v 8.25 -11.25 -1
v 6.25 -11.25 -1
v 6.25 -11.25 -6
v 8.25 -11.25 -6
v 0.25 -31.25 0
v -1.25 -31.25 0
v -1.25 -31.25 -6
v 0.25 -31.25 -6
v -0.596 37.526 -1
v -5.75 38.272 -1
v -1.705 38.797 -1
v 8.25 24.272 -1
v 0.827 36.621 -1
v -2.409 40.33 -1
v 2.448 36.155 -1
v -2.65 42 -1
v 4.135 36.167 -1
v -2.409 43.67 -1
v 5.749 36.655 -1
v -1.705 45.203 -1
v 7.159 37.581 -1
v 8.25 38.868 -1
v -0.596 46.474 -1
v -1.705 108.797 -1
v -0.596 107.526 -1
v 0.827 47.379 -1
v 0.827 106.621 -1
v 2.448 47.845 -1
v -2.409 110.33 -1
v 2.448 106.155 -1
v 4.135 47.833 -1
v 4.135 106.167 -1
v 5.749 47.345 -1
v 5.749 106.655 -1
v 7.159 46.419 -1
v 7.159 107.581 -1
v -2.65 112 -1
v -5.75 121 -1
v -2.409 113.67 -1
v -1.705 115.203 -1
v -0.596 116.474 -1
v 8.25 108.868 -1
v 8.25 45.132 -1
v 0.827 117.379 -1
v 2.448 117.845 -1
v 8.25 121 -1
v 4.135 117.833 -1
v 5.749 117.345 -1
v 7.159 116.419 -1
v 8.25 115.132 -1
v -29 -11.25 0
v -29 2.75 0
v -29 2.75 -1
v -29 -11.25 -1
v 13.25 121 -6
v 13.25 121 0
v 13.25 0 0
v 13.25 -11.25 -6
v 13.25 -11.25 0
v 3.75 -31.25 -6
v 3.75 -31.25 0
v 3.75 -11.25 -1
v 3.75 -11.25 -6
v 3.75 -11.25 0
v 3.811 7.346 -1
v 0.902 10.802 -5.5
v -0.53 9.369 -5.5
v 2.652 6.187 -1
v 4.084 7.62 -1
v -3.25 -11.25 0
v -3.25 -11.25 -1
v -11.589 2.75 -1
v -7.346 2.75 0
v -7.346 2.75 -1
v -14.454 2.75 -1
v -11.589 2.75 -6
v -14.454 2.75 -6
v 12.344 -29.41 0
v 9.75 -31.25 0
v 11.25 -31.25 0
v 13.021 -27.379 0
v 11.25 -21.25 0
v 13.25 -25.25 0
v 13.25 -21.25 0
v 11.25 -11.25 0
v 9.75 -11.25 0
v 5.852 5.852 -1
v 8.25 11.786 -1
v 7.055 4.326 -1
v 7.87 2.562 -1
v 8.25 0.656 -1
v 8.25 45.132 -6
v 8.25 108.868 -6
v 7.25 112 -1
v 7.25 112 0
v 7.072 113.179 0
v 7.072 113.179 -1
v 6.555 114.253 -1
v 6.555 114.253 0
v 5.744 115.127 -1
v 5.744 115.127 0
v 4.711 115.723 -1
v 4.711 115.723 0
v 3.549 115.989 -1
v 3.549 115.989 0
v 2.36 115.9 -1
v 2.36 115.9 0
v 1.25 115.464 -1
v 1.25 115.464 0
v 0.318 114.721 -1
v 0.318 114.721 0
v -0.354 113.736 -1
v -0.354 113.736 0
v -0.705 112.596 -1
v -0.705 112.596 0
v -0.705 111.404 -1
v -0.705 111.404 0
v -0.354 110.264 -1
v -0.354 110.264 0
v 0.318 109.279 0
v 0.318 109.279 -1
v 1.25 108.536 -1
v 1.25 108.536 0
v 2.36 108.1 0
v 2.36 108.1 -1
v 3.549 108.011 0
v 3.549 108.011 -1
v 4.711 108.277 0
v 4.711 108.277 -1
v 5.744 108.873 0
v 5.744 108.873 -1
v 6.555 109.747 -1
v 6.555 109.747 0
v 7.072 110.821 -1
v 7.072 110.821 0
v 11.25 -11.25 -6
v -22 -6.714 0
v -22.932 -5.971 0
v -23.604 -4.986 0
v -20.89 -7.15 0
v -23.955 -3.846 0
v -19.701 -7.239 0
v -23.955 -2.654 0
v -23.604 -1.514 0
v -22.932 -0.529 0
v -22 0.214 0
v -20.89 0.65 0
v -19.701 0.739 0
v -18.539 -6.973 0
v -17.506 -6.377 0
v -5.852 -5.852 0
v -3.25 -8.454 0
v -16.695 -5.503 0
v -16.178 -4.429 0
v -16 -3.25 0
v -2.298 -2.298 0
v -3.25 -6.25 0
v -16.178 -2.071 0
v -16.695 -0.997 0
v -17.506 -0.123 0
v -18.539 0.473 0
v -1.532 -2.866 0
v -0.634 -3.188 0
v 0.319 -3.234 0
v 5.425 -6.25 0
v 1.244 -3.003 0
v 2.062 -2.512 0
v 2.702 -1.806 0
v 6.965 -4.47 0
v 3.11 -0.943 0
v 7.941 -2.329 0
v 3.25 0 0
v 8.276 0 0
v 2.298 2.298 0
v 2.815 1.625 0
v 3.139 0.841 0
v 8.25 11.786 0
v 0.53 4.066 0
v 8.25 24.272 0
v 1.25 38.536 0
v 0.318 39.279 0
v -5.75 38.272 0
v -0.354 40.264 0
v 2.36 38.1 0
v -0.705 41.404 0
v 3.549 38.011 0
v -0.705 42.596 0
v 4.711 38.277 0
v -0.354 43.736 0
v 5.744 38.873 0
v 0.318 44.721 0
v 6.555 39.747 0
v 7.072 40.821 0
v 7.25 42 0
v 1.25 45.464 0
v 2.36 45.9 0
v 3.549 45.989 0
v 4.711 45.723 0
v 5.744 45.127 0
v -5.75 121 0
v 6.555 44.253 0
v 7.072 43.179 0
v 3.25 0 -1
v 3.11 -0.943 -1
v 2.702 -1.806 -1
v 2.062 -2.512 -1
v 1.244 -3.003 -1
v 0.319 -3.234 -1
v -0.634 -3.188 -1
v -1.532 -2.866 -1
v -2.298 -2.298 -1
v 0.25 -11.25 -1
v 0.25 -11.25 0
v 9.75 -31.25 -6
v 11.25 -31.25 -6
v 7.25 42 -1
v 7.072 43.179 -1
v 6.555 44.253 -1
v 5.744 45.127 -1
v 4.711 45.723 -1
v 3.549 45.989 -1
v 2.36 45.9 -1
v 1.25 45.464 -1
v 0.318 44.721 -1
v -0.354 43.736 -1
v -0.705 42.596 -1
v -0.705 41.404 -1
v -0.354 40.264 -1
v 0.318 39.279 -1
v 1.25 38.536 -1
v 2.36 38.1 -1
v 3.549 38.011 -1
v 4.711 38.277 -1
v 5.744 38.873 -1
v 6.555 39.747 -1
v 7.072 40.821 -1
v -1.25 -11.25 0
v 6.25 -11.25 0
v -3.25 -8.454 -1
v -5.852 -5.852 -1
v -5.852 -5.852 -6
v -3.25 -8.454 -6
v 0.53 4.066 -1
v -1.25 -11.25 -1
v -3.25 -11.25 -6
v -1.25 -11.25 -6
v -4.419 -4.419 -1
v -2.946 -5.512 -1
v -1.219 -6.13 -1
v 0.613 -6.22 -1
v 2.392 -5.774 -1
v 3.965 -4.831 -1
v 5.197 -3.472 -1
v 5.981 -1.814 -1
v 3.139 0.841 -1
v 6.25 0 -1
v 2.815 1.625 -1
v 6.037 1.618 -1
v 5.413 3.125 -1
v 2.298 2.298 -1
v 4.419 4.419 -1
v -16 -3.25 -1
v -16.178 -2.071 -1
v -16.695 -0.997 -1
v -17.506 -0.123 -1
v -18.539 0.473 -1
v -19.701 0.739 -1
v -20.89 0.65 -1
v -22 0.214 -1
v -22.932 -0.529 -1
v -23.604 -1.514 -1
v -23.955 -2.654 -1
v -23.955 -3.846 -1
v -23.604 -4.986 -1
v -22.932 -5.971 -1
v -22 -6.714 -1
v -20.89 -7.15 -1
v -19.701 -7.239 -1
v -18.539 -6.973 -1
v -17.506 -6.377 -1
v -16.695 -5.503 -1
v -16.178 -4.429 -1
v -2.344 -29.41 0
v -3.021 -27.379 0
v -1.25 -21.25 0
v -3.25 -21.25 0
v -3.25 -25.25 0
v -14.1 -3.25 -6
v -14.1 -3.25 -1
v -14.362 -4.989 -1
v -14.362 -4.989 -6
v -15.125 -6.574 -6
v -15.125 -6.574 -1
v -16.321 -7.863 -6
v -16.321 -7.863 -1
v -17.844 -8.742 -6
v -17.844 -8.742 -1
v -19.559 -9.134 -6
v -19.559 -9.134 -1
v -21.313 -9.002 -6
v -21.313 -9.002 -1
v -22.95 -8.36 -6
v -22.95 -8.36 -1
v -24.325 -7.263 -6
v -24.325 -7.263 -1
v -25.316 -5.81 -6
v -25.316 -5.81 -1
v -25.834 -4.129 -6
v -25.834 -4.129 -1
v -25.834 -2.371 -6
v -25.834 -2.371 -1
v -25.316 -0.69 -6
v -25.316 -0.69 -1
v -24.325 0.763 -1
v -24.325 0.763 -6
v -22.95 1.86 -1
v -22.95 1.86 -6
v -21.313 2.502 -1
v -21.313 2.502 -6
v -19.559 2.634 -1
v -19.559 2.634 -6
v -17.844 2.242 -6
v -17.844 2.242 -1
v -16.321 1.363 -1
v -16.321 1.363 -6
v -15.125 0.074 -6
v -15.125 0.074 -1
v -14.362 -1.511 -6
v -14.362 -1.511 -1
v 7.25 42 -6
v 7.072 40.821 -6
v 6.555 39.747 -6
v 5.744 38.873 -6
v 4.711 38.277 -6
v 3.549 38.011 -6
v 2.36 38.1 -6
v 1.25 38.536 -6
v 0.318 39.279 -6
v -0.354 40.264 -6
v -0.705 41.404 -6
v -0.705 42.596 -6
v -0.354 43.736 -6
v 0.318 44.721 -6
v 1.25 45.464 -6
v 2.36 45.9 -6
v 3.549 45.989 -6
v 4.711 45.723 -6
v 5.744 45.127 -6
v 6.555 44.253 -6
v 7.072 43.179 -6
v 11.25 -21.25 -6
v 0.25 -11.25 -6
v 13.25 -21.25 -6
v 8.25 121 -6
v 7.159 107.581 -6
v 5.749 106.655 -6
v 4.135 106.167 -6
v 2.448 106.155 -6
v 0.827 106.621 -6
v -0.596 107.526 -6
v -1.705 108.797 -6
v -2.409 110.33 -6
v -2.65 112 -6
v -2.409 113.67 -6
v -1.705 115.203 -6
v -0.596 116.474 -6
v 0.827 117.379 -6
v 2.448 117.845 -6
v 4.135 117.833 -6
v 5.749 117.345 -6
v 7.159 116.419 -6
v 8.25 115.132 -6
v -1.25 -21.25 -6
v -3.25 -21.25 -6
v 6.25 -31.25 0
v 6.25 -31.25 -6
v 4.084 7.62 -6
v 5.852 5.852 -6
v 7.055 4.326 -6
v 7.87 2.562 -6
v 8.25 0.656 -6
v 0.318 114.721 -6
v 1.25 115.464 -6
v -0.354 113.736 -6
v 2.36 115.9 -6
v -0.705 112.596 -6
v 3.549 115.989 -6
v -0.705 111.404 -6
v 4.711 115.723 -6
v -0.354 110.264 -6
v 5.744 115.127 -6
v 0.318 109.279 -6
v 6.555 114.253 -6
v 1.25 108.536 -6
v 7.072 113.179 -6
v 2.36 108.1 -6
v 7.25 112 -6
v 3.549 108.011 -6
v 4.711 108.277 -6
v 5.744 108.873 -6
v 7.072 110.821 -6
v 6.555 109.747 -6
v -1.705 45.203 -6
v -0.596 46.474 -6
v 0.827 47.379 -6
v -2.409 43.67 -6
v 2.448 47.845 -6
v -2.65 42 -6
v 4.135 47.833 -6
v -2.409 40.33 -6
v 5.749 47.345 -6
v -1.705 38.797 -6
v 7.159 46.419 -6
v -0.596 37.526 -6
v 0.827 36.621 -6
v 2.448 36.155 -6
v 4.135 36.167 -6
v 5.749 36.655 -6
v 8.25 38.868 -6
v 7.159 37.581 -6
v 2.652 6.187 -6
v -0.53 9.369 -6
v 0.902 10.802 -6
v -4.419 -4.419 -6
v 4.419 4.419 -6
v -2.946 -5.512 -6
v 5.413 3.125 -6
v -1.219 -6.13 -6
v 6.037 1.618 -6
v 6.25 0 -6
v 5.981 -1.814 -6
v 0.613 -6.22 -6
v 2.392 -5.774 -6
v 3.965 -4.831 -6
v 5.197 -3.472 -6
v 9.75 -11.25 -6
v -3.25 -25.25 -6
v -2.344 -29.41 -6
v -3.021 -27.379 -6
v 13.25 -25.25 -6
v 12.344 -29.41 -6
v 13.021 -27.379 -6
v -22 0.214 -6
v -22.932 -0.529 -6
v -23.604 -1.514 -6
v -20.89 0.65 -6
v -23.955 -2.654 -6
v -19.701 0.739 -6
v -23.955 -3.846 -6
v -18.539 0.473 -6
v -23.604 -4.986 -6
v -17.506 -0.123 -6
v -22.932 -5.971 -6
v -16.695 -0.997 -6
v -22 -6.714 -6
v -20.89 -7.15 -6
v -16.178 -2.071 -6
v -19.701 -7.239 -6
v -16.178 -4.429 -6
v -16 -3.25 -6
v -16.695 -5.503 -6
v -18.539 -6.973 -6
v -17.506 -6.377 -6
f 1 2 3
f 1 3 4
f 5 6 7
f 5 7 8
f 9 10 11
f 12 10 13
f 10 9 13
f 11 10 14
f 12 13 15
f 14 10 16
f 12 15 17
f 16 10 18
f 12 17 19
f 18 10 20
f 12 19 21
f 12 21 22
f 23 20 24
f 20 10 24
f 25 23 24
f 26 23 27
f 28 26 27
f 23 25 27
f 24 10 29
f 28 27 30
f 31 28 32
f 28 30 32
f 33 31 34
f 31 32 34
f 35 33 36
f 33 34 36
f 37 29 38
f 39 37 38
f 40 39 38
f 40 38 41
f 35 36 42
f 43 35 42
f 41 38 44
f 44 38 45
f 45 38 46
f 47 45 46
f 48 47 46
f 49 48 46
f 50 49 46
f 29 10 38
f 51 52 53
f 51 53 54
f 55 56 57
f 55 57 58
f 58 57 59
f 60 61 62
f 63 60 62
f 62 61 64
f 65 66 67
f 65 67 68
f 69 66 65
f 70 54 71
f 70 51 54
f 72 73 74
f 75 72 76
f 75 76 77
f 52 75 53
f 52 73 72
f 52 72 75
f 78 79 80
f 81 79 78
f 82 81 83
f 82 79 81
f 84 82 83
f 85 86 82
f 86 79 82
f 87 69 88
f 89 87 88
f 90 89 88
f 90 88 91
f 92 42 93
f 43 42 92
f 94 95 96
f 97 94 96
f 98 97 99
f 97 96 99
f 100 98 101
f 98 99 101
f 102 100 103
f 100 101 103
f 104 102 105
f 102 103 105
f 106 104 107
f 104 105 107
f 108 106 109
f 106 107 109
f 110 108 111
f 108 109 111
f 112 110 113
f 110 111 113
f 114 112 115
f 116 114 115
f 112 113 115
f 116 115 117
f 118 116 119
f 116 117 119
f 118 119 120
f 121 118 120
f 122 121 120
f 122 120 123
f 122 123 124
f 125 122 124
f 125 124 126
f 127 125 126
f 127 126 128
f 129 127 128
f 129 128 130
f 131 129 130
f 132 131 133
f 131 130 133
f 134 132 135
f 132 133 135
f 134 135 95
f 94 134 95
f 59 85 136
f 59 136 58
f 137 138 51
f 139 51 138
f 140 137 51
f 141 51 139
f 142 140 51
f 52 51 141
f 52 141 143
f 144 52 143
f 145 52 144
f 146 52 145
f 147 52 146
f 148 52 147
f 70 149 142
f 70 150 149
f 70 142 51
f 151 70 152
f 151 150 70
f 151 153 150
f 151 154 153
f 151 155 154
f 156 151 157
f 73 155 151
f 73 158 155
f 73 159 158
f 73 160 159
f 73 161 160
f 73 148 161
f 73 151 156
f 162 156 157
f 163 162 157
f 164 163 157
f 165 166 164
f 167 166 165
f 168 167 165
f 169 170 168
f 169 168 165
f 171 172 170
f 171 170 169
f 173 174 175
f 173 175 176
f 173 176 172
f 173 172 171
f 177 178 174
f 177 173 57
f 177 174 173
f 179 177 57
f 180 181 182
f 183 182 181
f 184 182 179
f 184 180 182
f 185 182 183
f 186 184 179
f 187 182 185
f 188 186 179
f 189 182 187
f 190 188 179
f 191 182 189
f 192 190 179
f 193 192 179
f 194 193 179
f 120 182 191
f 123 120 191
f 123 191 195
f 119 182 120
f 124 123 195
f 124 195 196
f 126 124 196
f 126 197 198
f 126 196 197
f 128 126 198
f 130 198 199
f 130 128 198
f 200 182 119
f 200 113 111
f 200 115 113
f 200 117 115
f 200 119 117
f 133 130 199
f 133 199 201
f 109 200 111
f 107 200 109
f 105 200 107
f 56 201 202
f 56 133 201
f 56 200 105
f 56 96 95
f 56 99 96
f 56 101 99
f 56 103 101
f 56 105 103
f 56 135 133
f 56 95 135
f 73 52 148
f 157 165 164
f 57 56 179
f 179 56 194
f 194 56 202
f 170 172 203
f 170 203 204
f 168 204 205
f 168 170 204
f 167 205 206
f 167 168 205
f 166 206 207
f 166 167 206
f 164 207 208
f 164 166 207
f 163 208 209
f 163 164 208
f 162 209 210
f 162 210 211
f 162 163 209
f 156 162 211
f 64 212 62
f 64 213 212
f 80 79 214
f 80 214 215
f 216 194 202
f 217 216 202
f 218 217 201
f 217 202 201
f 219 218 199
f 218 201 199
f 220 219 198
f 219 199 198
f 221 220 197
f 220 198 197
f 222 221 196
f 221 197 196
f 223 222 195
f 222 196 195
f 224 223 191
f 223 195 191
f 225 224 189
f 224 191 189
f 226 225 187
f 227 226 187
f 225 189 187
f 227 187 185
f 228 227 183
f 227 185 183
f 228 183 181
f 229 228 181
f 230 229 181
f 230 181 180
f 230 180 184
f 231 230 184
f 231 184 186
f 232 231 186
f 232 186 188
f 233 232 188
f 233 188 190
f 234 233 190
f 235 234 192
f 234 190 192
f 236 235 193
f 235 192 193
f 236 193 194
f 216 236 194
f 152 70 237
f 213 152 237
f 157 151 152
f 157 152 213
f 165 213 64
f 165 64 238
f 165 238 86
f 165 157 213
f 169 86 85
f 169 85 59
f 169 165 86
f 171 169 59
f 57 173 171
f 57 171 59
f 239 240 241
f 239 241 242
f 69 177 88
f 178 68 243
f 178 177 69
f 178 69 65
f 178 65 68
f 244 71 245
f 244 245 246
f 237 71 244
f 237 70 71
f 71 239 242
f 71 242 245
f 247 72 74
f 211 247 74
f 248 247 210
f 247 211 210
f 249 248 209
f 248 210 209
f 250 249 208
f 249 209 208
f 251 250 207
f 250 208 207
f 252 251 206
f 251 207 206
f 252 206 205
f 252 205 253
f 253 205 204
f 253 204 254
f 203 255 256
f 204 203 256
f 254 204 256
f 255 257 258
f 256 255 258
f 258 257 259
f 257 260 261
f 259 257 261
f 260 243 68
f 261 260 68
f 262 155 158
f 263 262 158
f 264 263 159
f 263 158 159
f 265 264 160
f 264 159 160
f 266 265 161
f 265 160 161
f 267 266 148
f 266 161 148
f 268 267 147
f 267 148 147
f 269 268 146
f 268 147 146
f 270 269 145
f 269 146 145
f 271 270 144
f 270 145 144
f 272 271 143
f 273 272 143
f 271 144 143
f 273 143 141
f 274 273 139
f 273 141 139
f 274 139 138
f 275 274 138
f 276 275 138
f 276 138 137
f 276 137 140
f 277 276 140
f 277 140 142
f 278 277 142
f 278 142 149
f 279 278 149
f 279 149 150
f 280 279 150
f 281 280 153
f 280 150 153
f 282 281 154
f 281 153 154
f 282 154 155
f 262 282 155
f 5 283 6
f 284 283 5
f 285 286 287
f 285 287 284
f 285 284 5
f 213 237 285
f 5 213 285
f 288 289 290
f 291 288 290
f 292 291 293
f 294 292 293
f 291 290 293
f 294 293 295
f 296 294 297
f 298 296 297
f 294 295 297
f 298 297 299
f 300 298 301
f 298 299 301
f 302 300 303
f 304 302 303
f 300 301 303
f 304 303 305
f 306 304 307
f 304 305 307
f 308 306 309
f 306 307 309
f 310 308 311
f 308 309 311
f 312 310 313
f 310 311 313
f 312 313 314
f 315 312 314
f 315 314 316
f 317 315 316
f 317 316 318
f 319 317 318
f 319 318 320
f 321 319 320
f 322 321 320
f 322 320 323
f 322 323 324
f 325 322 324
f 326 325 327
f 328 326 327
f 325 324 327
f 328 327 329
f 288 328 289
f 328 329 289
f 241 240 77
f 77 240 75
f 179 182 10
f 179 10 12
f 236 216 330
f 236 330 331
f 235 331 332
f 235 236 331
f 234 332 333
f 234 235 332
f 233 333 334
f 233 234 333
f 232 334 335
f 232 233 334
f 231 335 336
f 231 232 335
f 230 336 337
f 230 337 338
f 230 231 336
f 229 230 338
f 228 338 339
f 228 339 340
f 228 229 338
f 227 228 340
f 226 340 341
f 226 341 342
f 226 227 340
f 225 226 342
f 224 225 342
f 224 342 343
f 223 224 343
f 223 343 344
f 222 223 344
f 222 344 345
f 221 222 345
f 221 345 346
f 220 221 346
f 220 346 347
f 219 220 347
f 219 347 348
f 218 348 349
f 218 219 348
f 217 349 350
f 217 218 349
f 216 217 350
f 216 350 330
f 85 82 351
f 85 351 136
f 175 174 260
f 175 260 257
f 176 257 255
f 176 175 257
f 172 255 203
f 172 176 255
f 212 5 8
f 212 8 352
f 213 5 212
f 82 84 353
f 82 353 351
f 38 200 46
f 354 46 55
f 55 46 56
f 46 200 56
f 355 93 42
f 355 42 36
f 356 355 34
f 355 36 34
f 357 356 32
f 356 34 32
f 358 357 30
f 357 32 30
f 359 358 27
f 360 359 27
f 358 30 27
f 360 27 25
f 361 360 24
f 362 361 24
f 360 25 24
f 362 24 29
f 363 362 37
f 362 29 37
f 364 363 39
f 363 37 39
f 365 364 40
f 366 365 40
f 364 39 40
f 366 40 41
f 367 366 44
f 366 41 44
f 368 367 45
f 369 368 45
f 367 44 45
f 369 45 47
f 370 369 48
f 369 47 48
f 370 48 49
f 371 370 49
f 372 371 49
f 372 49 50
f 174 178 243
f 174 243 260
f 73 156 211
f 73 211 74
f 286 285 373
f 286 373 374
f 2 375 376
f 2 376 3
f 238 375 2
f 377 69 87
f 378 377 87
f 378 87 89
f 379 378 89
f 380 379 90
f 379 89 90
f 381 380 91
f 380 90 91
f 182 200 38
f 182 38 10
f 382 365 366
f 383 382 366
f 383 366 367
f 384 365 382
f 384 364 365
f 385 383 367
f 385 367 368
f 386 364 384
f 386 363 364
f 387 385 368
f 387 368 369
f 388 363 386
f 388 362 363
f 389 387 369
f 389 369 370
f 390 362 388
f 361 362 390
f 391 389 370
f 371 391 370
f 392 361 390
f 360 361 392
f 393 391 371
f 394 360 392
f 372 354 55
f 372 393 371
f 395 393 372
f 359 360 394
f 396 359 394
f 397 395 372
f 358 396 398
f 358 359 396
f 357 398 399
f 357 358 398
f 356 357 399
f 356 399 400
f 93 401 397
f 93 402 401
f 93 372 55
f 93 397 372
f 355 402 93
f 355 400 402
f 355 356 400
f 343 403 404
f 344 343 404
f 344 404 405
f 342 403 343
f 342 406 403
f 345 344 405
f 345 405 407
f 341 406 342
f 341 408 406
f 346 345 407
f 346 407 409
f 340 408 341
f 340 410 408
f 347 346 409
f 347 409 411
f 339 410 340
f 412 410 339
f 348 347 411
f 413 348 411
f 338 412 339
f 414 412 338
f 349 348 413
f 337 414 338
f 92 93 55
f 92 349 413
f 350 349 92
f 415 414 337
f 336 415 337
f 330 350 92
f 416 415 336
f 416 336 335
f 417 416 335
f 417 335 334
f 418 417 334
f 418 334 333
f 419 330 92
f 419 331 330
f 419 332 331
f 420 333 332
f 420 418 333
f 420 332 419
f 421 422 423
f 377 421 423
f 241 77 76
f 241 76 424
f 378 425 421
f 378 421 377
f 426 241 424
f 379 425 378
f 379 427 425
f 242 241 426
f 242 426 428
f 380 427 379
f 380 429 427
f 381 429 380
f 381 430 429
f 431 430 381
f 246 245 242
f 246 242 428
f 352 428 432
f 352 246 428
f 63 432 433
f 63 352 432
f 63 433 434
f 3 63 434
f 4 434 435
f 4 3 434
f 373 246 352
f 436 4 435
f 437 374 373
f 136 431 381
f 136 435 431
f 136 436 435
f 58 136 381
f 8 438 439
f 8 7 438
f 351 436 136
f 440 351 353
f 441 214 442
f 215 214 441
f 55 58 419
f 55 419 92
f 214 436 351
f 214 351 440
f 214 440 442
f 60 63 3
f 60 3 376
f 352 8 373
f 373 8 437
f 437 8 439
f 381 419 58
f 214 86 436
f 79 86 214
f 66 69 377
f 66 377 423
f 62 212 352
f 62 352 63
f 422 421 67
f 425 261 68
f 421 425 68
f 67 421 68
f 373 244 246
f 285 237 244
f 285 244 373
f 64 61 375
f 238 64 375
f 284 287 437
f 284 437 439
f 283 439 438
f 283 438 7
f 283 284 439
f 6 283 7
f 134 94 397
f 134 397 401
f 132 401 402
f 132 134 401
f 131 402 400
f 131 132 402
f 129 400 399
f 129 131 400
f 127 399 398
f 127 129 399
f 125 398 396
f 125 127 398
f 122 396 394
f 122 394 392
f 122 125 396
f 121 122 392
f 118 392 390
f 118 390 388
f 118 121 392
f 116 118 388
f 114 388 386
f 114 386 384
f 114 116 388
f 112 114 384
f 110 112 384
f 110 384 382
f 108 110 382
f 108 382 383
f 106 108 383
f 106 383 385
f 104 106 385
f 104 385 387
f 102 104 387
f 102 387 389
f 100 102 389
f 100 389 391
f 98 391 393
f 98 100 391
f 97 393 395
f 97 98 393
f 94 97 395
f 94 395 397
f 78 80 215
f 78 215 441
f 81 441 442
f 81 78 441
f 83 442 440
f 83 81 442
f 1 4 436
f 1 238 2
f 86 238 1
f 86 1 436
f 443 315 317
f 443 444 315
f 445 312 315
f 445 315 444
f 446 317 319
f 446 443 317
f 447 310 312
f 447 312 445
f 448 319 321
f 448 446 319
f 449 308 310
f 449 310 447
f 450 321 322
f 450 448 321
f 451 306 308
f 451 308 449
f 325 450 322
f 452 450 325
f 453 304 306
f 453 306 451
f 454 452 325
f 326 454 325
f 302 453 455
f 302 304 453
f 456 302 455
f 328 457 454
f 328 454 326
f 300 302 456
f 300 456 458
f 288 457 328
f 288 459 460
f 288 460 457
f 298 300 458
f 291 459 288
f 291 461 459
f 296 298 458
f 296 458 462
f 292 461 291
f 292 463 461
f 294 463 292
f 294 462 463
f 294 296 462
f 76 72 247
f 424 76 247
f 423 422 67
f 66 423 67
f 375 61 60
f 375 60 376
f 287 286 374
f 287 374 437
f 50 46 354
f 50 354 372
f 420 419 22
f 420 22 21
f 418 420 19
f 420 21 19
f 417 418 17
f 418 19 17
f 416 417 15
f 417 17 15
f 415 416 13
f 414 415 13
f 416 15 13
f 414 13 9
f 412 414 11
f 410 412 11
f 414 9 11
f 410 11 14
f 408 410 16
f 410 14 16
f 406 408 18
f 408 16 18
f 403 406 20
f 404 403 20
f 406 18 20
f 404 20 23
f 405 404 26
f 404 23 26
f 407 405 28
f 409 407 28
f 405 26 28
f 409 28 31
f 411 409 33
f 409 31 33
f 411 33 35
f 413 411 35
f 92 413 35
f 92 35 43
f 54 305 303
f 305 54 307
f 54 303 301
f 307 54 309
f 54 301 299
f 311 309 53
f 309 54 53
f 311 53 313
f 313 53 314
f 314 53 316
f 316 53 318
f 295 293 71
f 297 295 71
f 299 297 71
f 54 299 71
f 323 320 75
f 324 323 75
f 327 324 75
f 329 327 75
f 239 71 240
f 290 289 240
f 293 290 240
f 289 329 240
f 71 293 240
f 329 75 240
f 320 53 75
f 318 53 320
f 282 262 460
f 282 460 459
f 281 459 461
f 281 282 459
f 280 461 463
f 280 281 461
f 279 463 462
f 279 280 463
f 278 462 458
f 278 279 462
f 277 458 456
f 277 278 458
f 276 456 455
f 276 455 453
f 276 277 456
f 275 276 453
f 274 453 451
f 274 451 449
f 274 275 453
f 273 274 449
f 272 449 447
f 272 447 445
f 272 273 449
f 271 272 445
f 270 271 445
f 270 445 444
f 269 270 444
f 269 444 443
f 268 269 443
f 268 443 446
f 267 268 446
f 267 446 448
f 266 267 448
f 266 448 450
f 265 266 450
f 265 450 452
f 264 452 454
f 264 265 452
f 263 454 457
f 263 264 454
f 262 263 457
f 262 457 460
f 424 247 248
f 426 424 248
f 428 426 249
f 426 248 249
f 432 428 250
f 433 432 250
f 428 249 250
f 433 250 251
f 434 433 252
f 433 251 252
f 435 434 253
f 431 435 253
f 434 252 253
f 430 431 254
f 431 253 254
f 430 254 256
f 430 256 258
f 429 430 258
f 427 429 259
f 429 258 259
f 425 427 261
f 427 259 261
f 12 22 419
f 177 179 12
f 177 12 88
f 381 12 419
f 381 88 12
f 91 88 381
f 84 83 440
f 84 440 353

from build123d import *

# Parameters (mm, degrees)
F0_R     = 4
F0_W     = 19
F0_H     = 69
F1_DEPTH = 1
F2_R     = 5.9
F2_R_2   = 4
F3_DEPTH = 5
F5_DEPTH = 2.02602933
F6_W     = 5
F6_H     = 132.25
F7_DEPTH = 5
F8_W     = 2.5
F8_H     = 20
F9_DEPTH = 6


with BuildPart() as f1:
    # F0 (on Top) → F1 (new body)
    with BuildSketch(Plane.XY):
        with BuildLine():
            ThreePointArc((2.2980970389, 2.2980970389), (3.0026084807, 1.2437211552), (3.25, 0))
            ThreePointArc((3.25, 0), (1.2437211552, -3.0026084807), (-2.2980970389, -2.2980970389))
            Line((-2.2980970389, -2.2980970389), (-7.3461940777, 2.75))
            Line((-7.3461940777, 2.75), (-29, 2.75))
            Line((-29, 2.75), (-29, -11.25))
            Line((-29, -11.25), (13.25, -11.25))
            Line((13.25, -11.25), (13.25, 52))
            Line((13.25, 52), (-5.75, 52))
            Line((-5.75, 52), (-5.75, 38.2720779386))
            Line((-5.75, 38.2720779386), (8.25, 24.2720779386))
            Line((8.25, 24.2720779386), (8.25, 11.7855339059))
            Line((8.25, 11.7855339059), (0.5303300859, 4.0658639918))
            Line((0.5303300859, 4.0658639918), (2.2980970389, 2.2980970389))
        make_face()
        with Locations((-20, -3.25)):
            Circle(F0_R, mode=Mode.SUBTRACT)
        with Locations((3.25, 42)):
            Circle(F0_R, mode=Mode.SUBTRACT)
        with Locations((3.75, 86.5)):
            Rectangle(F0_W, F0_H)
        with Locations((3.25, 112)):
            Circle(F0_R, mode=Mode.SUBTRACT)
    extrude(amount=-F1_DEPTH)

    # F2 (on face) → F3 (join)
    with BuildSketch(Plane(origin=(0, 0, -1), x_dir=(1, 0, 0), z_dir=(0, 0, -1))):
        with Locations((-20, 3.25)):
            Circle(F2_R)
        with Locations((-20, 3.25)):
            Circle(F2_R_2, mode=Mode.SUBTRACT)
        with BuildLine():
            Line((-11.5888347648, -2.75), (-8.2554414615, 0.5833933033))
            ThreePointArc((-8.2554414615, 0.5833933033), (-7.5296004881, 3.434789362), (-5.8520364605, 5.8520364605))
            Line((-5.8520364605, 5.8520364605), (-14.4540729211, -2.75))
            Line((-14.4540729211, -2.75), (-11.5888347648, -2.75))
        make_face()
        with BuildLine():
            ThreePointArc((-4.4194173824, 4.4194173824), (2.3917714523, 5.7742470782), (6.25, 0))
            ThreePointArc((6.25, 0), (5.7742470782, -2.3917714523), (4.4194173824, -4.4194173824))
            Line((4.4194173824, -4.4194173824), (2.6516504294, -6.1871843354))
            Line((2.6516504294, -6.1871843354), (3.8108825911, -7.346416497))
            ThreePointArc((3.8108825911, -7.346416497), (4.8888949746, -6.6776767965), (5.8520364605, -5.8520364605))
            ThreePointArc((5.8520364605, -5.8520364605), (7.6460541085, -3.1670993104), (8.27602933, 0))
            ThreePointArc((8.27602933, 0), (3.1670993104, 7.6460541085), (-5.8520364605, 5.8520364605))
            ThreePointArc((-5.8520364605, 5.8520364605), (-7.5296004881, 3.434789362), (-8.2554414615, 0.5833933033))
            Line((-8.2554414615, 0.5833933033), (-4.4194173824, 4.4194173824))
        make_face()
        with BuildLine():
            ThreePointArc((5.8520364605, -5.8520364605), (4.8888949746, -6.6776767965), (3.8108825911, -7.346416497))
            Line((3.8108825911, -7.346416497), (4.0842695076, -7.6198034135))
            Line((4.0842695076, -7.6198034135), (5.8520364605, -5.8520364605))
        make_face()
        with Locations((3.25, -42)):
            Circle(F2_R)
        with Locations((3.25, -42)):
            Circle(F2_R_2, mode=Mode.SUBTRACT)
        with Locations((3.25, -112)):
            Circle(F2_R)
        with Locations((3.25, -112)):
            Circle(F2_R_2, mode=Mode.SUBTRACT)
    extrude(amount=F3_DEPTH)

    # F4 (on face) → F5 (join, through all)
    with BuildSketch(Plane(origin=(5.8520364605, 5.8520364605, 0), x_dir=(-0.7071067812, 0.7071067812, 0), z_dir=(0.7071067812, 0.7071067812, 0))):
        Polygon((2.5, -1), (2.5, -6), (7, -6), (7, -5.5), align=None)
    extrude(amount=-F5_DEPTH)

    # F6 (on face) → F7 (join)
    with BuildSketch(Plane(origin=(0, 0, -1), x_dir=(1, 0, 0), z_dir=(0, 0, -1))):
        with Locations((10.75, -54.875)):
            Rectangle(F6_W, F6_H)
    extrude(amount=F7_DEPTH)

    # F8 (on Top) → F9 (join)
    with BuildSketch(Plane.XY):
        Polygon((11.25, -11.25), (13.25, -11.25), (13.25, -6.25), (5.4249572783, -6.25), (-3.25, -6.25), (-3.25, -8.4540729211), (-3.25, -11.25), (-1.25, -11.25), (0.25, -11.25), (3.75, -11.25), (6.25, -11.25), (9.75, -11.25), align=None)
        with BuildLine():
            Line((11.25, -21.25), (11.25, -11.25))
            Line((11.25, -11.25), (9.75, -11.25))
            Line((9.75, -11.25), (9.75, -31.25))
            Line((9.75, -31.25), (11.25, -31.25))
            ThreePointArc((11.25, -31.25), (12.7368329805, -28.4122776602), (13.25, -25.25))
            Line((13.25, -25.25), (13.25, -21.25))
            Line((13.25, -21.25), (11.25, -21.25))
        make_face()
        with BuildLine():
            Line((5.4249572783, -6.25), (13.25, -6.25))
            Line((13.25, -6.25), (13.25, 0))
            Line((13.25, 0), (8.27602933, 0))
            ThreePointArc((8.27602933, 0), (7.5296004881, -3.434789362), (5.4249572783, -6.25))
        make_face()
        with Locations((5, -21.25)):
            Rectangle(F8_W, F8_H)
        Polygon((-3.25, -8.4540729211), (-3.25, -6.25), (-5.8520364605, -5.8520364605), align=None)
        with BuildLine():
            Line((0.25, -31.25), (0.25, -11.25))
            Line((0.25, -11.25), (-1.25, -11.25))
            Line((-1.25, -11.25), (-1.25, -21.25))
            Line((-1.25, -21.25), (-3.25, -21.25))
            Line((-3.25, -21.25), (-3.25, -25.25))
            ThreePointArc((-3.25, -25.25), (-2.7368329805, -28.4122776602), (-1.25, -31.25))
            Line((-1.25, -31.25), (0.25, -31.25))
        make_face()
    extrude(amount=-F9_DEPTH)


solid = f1.part
